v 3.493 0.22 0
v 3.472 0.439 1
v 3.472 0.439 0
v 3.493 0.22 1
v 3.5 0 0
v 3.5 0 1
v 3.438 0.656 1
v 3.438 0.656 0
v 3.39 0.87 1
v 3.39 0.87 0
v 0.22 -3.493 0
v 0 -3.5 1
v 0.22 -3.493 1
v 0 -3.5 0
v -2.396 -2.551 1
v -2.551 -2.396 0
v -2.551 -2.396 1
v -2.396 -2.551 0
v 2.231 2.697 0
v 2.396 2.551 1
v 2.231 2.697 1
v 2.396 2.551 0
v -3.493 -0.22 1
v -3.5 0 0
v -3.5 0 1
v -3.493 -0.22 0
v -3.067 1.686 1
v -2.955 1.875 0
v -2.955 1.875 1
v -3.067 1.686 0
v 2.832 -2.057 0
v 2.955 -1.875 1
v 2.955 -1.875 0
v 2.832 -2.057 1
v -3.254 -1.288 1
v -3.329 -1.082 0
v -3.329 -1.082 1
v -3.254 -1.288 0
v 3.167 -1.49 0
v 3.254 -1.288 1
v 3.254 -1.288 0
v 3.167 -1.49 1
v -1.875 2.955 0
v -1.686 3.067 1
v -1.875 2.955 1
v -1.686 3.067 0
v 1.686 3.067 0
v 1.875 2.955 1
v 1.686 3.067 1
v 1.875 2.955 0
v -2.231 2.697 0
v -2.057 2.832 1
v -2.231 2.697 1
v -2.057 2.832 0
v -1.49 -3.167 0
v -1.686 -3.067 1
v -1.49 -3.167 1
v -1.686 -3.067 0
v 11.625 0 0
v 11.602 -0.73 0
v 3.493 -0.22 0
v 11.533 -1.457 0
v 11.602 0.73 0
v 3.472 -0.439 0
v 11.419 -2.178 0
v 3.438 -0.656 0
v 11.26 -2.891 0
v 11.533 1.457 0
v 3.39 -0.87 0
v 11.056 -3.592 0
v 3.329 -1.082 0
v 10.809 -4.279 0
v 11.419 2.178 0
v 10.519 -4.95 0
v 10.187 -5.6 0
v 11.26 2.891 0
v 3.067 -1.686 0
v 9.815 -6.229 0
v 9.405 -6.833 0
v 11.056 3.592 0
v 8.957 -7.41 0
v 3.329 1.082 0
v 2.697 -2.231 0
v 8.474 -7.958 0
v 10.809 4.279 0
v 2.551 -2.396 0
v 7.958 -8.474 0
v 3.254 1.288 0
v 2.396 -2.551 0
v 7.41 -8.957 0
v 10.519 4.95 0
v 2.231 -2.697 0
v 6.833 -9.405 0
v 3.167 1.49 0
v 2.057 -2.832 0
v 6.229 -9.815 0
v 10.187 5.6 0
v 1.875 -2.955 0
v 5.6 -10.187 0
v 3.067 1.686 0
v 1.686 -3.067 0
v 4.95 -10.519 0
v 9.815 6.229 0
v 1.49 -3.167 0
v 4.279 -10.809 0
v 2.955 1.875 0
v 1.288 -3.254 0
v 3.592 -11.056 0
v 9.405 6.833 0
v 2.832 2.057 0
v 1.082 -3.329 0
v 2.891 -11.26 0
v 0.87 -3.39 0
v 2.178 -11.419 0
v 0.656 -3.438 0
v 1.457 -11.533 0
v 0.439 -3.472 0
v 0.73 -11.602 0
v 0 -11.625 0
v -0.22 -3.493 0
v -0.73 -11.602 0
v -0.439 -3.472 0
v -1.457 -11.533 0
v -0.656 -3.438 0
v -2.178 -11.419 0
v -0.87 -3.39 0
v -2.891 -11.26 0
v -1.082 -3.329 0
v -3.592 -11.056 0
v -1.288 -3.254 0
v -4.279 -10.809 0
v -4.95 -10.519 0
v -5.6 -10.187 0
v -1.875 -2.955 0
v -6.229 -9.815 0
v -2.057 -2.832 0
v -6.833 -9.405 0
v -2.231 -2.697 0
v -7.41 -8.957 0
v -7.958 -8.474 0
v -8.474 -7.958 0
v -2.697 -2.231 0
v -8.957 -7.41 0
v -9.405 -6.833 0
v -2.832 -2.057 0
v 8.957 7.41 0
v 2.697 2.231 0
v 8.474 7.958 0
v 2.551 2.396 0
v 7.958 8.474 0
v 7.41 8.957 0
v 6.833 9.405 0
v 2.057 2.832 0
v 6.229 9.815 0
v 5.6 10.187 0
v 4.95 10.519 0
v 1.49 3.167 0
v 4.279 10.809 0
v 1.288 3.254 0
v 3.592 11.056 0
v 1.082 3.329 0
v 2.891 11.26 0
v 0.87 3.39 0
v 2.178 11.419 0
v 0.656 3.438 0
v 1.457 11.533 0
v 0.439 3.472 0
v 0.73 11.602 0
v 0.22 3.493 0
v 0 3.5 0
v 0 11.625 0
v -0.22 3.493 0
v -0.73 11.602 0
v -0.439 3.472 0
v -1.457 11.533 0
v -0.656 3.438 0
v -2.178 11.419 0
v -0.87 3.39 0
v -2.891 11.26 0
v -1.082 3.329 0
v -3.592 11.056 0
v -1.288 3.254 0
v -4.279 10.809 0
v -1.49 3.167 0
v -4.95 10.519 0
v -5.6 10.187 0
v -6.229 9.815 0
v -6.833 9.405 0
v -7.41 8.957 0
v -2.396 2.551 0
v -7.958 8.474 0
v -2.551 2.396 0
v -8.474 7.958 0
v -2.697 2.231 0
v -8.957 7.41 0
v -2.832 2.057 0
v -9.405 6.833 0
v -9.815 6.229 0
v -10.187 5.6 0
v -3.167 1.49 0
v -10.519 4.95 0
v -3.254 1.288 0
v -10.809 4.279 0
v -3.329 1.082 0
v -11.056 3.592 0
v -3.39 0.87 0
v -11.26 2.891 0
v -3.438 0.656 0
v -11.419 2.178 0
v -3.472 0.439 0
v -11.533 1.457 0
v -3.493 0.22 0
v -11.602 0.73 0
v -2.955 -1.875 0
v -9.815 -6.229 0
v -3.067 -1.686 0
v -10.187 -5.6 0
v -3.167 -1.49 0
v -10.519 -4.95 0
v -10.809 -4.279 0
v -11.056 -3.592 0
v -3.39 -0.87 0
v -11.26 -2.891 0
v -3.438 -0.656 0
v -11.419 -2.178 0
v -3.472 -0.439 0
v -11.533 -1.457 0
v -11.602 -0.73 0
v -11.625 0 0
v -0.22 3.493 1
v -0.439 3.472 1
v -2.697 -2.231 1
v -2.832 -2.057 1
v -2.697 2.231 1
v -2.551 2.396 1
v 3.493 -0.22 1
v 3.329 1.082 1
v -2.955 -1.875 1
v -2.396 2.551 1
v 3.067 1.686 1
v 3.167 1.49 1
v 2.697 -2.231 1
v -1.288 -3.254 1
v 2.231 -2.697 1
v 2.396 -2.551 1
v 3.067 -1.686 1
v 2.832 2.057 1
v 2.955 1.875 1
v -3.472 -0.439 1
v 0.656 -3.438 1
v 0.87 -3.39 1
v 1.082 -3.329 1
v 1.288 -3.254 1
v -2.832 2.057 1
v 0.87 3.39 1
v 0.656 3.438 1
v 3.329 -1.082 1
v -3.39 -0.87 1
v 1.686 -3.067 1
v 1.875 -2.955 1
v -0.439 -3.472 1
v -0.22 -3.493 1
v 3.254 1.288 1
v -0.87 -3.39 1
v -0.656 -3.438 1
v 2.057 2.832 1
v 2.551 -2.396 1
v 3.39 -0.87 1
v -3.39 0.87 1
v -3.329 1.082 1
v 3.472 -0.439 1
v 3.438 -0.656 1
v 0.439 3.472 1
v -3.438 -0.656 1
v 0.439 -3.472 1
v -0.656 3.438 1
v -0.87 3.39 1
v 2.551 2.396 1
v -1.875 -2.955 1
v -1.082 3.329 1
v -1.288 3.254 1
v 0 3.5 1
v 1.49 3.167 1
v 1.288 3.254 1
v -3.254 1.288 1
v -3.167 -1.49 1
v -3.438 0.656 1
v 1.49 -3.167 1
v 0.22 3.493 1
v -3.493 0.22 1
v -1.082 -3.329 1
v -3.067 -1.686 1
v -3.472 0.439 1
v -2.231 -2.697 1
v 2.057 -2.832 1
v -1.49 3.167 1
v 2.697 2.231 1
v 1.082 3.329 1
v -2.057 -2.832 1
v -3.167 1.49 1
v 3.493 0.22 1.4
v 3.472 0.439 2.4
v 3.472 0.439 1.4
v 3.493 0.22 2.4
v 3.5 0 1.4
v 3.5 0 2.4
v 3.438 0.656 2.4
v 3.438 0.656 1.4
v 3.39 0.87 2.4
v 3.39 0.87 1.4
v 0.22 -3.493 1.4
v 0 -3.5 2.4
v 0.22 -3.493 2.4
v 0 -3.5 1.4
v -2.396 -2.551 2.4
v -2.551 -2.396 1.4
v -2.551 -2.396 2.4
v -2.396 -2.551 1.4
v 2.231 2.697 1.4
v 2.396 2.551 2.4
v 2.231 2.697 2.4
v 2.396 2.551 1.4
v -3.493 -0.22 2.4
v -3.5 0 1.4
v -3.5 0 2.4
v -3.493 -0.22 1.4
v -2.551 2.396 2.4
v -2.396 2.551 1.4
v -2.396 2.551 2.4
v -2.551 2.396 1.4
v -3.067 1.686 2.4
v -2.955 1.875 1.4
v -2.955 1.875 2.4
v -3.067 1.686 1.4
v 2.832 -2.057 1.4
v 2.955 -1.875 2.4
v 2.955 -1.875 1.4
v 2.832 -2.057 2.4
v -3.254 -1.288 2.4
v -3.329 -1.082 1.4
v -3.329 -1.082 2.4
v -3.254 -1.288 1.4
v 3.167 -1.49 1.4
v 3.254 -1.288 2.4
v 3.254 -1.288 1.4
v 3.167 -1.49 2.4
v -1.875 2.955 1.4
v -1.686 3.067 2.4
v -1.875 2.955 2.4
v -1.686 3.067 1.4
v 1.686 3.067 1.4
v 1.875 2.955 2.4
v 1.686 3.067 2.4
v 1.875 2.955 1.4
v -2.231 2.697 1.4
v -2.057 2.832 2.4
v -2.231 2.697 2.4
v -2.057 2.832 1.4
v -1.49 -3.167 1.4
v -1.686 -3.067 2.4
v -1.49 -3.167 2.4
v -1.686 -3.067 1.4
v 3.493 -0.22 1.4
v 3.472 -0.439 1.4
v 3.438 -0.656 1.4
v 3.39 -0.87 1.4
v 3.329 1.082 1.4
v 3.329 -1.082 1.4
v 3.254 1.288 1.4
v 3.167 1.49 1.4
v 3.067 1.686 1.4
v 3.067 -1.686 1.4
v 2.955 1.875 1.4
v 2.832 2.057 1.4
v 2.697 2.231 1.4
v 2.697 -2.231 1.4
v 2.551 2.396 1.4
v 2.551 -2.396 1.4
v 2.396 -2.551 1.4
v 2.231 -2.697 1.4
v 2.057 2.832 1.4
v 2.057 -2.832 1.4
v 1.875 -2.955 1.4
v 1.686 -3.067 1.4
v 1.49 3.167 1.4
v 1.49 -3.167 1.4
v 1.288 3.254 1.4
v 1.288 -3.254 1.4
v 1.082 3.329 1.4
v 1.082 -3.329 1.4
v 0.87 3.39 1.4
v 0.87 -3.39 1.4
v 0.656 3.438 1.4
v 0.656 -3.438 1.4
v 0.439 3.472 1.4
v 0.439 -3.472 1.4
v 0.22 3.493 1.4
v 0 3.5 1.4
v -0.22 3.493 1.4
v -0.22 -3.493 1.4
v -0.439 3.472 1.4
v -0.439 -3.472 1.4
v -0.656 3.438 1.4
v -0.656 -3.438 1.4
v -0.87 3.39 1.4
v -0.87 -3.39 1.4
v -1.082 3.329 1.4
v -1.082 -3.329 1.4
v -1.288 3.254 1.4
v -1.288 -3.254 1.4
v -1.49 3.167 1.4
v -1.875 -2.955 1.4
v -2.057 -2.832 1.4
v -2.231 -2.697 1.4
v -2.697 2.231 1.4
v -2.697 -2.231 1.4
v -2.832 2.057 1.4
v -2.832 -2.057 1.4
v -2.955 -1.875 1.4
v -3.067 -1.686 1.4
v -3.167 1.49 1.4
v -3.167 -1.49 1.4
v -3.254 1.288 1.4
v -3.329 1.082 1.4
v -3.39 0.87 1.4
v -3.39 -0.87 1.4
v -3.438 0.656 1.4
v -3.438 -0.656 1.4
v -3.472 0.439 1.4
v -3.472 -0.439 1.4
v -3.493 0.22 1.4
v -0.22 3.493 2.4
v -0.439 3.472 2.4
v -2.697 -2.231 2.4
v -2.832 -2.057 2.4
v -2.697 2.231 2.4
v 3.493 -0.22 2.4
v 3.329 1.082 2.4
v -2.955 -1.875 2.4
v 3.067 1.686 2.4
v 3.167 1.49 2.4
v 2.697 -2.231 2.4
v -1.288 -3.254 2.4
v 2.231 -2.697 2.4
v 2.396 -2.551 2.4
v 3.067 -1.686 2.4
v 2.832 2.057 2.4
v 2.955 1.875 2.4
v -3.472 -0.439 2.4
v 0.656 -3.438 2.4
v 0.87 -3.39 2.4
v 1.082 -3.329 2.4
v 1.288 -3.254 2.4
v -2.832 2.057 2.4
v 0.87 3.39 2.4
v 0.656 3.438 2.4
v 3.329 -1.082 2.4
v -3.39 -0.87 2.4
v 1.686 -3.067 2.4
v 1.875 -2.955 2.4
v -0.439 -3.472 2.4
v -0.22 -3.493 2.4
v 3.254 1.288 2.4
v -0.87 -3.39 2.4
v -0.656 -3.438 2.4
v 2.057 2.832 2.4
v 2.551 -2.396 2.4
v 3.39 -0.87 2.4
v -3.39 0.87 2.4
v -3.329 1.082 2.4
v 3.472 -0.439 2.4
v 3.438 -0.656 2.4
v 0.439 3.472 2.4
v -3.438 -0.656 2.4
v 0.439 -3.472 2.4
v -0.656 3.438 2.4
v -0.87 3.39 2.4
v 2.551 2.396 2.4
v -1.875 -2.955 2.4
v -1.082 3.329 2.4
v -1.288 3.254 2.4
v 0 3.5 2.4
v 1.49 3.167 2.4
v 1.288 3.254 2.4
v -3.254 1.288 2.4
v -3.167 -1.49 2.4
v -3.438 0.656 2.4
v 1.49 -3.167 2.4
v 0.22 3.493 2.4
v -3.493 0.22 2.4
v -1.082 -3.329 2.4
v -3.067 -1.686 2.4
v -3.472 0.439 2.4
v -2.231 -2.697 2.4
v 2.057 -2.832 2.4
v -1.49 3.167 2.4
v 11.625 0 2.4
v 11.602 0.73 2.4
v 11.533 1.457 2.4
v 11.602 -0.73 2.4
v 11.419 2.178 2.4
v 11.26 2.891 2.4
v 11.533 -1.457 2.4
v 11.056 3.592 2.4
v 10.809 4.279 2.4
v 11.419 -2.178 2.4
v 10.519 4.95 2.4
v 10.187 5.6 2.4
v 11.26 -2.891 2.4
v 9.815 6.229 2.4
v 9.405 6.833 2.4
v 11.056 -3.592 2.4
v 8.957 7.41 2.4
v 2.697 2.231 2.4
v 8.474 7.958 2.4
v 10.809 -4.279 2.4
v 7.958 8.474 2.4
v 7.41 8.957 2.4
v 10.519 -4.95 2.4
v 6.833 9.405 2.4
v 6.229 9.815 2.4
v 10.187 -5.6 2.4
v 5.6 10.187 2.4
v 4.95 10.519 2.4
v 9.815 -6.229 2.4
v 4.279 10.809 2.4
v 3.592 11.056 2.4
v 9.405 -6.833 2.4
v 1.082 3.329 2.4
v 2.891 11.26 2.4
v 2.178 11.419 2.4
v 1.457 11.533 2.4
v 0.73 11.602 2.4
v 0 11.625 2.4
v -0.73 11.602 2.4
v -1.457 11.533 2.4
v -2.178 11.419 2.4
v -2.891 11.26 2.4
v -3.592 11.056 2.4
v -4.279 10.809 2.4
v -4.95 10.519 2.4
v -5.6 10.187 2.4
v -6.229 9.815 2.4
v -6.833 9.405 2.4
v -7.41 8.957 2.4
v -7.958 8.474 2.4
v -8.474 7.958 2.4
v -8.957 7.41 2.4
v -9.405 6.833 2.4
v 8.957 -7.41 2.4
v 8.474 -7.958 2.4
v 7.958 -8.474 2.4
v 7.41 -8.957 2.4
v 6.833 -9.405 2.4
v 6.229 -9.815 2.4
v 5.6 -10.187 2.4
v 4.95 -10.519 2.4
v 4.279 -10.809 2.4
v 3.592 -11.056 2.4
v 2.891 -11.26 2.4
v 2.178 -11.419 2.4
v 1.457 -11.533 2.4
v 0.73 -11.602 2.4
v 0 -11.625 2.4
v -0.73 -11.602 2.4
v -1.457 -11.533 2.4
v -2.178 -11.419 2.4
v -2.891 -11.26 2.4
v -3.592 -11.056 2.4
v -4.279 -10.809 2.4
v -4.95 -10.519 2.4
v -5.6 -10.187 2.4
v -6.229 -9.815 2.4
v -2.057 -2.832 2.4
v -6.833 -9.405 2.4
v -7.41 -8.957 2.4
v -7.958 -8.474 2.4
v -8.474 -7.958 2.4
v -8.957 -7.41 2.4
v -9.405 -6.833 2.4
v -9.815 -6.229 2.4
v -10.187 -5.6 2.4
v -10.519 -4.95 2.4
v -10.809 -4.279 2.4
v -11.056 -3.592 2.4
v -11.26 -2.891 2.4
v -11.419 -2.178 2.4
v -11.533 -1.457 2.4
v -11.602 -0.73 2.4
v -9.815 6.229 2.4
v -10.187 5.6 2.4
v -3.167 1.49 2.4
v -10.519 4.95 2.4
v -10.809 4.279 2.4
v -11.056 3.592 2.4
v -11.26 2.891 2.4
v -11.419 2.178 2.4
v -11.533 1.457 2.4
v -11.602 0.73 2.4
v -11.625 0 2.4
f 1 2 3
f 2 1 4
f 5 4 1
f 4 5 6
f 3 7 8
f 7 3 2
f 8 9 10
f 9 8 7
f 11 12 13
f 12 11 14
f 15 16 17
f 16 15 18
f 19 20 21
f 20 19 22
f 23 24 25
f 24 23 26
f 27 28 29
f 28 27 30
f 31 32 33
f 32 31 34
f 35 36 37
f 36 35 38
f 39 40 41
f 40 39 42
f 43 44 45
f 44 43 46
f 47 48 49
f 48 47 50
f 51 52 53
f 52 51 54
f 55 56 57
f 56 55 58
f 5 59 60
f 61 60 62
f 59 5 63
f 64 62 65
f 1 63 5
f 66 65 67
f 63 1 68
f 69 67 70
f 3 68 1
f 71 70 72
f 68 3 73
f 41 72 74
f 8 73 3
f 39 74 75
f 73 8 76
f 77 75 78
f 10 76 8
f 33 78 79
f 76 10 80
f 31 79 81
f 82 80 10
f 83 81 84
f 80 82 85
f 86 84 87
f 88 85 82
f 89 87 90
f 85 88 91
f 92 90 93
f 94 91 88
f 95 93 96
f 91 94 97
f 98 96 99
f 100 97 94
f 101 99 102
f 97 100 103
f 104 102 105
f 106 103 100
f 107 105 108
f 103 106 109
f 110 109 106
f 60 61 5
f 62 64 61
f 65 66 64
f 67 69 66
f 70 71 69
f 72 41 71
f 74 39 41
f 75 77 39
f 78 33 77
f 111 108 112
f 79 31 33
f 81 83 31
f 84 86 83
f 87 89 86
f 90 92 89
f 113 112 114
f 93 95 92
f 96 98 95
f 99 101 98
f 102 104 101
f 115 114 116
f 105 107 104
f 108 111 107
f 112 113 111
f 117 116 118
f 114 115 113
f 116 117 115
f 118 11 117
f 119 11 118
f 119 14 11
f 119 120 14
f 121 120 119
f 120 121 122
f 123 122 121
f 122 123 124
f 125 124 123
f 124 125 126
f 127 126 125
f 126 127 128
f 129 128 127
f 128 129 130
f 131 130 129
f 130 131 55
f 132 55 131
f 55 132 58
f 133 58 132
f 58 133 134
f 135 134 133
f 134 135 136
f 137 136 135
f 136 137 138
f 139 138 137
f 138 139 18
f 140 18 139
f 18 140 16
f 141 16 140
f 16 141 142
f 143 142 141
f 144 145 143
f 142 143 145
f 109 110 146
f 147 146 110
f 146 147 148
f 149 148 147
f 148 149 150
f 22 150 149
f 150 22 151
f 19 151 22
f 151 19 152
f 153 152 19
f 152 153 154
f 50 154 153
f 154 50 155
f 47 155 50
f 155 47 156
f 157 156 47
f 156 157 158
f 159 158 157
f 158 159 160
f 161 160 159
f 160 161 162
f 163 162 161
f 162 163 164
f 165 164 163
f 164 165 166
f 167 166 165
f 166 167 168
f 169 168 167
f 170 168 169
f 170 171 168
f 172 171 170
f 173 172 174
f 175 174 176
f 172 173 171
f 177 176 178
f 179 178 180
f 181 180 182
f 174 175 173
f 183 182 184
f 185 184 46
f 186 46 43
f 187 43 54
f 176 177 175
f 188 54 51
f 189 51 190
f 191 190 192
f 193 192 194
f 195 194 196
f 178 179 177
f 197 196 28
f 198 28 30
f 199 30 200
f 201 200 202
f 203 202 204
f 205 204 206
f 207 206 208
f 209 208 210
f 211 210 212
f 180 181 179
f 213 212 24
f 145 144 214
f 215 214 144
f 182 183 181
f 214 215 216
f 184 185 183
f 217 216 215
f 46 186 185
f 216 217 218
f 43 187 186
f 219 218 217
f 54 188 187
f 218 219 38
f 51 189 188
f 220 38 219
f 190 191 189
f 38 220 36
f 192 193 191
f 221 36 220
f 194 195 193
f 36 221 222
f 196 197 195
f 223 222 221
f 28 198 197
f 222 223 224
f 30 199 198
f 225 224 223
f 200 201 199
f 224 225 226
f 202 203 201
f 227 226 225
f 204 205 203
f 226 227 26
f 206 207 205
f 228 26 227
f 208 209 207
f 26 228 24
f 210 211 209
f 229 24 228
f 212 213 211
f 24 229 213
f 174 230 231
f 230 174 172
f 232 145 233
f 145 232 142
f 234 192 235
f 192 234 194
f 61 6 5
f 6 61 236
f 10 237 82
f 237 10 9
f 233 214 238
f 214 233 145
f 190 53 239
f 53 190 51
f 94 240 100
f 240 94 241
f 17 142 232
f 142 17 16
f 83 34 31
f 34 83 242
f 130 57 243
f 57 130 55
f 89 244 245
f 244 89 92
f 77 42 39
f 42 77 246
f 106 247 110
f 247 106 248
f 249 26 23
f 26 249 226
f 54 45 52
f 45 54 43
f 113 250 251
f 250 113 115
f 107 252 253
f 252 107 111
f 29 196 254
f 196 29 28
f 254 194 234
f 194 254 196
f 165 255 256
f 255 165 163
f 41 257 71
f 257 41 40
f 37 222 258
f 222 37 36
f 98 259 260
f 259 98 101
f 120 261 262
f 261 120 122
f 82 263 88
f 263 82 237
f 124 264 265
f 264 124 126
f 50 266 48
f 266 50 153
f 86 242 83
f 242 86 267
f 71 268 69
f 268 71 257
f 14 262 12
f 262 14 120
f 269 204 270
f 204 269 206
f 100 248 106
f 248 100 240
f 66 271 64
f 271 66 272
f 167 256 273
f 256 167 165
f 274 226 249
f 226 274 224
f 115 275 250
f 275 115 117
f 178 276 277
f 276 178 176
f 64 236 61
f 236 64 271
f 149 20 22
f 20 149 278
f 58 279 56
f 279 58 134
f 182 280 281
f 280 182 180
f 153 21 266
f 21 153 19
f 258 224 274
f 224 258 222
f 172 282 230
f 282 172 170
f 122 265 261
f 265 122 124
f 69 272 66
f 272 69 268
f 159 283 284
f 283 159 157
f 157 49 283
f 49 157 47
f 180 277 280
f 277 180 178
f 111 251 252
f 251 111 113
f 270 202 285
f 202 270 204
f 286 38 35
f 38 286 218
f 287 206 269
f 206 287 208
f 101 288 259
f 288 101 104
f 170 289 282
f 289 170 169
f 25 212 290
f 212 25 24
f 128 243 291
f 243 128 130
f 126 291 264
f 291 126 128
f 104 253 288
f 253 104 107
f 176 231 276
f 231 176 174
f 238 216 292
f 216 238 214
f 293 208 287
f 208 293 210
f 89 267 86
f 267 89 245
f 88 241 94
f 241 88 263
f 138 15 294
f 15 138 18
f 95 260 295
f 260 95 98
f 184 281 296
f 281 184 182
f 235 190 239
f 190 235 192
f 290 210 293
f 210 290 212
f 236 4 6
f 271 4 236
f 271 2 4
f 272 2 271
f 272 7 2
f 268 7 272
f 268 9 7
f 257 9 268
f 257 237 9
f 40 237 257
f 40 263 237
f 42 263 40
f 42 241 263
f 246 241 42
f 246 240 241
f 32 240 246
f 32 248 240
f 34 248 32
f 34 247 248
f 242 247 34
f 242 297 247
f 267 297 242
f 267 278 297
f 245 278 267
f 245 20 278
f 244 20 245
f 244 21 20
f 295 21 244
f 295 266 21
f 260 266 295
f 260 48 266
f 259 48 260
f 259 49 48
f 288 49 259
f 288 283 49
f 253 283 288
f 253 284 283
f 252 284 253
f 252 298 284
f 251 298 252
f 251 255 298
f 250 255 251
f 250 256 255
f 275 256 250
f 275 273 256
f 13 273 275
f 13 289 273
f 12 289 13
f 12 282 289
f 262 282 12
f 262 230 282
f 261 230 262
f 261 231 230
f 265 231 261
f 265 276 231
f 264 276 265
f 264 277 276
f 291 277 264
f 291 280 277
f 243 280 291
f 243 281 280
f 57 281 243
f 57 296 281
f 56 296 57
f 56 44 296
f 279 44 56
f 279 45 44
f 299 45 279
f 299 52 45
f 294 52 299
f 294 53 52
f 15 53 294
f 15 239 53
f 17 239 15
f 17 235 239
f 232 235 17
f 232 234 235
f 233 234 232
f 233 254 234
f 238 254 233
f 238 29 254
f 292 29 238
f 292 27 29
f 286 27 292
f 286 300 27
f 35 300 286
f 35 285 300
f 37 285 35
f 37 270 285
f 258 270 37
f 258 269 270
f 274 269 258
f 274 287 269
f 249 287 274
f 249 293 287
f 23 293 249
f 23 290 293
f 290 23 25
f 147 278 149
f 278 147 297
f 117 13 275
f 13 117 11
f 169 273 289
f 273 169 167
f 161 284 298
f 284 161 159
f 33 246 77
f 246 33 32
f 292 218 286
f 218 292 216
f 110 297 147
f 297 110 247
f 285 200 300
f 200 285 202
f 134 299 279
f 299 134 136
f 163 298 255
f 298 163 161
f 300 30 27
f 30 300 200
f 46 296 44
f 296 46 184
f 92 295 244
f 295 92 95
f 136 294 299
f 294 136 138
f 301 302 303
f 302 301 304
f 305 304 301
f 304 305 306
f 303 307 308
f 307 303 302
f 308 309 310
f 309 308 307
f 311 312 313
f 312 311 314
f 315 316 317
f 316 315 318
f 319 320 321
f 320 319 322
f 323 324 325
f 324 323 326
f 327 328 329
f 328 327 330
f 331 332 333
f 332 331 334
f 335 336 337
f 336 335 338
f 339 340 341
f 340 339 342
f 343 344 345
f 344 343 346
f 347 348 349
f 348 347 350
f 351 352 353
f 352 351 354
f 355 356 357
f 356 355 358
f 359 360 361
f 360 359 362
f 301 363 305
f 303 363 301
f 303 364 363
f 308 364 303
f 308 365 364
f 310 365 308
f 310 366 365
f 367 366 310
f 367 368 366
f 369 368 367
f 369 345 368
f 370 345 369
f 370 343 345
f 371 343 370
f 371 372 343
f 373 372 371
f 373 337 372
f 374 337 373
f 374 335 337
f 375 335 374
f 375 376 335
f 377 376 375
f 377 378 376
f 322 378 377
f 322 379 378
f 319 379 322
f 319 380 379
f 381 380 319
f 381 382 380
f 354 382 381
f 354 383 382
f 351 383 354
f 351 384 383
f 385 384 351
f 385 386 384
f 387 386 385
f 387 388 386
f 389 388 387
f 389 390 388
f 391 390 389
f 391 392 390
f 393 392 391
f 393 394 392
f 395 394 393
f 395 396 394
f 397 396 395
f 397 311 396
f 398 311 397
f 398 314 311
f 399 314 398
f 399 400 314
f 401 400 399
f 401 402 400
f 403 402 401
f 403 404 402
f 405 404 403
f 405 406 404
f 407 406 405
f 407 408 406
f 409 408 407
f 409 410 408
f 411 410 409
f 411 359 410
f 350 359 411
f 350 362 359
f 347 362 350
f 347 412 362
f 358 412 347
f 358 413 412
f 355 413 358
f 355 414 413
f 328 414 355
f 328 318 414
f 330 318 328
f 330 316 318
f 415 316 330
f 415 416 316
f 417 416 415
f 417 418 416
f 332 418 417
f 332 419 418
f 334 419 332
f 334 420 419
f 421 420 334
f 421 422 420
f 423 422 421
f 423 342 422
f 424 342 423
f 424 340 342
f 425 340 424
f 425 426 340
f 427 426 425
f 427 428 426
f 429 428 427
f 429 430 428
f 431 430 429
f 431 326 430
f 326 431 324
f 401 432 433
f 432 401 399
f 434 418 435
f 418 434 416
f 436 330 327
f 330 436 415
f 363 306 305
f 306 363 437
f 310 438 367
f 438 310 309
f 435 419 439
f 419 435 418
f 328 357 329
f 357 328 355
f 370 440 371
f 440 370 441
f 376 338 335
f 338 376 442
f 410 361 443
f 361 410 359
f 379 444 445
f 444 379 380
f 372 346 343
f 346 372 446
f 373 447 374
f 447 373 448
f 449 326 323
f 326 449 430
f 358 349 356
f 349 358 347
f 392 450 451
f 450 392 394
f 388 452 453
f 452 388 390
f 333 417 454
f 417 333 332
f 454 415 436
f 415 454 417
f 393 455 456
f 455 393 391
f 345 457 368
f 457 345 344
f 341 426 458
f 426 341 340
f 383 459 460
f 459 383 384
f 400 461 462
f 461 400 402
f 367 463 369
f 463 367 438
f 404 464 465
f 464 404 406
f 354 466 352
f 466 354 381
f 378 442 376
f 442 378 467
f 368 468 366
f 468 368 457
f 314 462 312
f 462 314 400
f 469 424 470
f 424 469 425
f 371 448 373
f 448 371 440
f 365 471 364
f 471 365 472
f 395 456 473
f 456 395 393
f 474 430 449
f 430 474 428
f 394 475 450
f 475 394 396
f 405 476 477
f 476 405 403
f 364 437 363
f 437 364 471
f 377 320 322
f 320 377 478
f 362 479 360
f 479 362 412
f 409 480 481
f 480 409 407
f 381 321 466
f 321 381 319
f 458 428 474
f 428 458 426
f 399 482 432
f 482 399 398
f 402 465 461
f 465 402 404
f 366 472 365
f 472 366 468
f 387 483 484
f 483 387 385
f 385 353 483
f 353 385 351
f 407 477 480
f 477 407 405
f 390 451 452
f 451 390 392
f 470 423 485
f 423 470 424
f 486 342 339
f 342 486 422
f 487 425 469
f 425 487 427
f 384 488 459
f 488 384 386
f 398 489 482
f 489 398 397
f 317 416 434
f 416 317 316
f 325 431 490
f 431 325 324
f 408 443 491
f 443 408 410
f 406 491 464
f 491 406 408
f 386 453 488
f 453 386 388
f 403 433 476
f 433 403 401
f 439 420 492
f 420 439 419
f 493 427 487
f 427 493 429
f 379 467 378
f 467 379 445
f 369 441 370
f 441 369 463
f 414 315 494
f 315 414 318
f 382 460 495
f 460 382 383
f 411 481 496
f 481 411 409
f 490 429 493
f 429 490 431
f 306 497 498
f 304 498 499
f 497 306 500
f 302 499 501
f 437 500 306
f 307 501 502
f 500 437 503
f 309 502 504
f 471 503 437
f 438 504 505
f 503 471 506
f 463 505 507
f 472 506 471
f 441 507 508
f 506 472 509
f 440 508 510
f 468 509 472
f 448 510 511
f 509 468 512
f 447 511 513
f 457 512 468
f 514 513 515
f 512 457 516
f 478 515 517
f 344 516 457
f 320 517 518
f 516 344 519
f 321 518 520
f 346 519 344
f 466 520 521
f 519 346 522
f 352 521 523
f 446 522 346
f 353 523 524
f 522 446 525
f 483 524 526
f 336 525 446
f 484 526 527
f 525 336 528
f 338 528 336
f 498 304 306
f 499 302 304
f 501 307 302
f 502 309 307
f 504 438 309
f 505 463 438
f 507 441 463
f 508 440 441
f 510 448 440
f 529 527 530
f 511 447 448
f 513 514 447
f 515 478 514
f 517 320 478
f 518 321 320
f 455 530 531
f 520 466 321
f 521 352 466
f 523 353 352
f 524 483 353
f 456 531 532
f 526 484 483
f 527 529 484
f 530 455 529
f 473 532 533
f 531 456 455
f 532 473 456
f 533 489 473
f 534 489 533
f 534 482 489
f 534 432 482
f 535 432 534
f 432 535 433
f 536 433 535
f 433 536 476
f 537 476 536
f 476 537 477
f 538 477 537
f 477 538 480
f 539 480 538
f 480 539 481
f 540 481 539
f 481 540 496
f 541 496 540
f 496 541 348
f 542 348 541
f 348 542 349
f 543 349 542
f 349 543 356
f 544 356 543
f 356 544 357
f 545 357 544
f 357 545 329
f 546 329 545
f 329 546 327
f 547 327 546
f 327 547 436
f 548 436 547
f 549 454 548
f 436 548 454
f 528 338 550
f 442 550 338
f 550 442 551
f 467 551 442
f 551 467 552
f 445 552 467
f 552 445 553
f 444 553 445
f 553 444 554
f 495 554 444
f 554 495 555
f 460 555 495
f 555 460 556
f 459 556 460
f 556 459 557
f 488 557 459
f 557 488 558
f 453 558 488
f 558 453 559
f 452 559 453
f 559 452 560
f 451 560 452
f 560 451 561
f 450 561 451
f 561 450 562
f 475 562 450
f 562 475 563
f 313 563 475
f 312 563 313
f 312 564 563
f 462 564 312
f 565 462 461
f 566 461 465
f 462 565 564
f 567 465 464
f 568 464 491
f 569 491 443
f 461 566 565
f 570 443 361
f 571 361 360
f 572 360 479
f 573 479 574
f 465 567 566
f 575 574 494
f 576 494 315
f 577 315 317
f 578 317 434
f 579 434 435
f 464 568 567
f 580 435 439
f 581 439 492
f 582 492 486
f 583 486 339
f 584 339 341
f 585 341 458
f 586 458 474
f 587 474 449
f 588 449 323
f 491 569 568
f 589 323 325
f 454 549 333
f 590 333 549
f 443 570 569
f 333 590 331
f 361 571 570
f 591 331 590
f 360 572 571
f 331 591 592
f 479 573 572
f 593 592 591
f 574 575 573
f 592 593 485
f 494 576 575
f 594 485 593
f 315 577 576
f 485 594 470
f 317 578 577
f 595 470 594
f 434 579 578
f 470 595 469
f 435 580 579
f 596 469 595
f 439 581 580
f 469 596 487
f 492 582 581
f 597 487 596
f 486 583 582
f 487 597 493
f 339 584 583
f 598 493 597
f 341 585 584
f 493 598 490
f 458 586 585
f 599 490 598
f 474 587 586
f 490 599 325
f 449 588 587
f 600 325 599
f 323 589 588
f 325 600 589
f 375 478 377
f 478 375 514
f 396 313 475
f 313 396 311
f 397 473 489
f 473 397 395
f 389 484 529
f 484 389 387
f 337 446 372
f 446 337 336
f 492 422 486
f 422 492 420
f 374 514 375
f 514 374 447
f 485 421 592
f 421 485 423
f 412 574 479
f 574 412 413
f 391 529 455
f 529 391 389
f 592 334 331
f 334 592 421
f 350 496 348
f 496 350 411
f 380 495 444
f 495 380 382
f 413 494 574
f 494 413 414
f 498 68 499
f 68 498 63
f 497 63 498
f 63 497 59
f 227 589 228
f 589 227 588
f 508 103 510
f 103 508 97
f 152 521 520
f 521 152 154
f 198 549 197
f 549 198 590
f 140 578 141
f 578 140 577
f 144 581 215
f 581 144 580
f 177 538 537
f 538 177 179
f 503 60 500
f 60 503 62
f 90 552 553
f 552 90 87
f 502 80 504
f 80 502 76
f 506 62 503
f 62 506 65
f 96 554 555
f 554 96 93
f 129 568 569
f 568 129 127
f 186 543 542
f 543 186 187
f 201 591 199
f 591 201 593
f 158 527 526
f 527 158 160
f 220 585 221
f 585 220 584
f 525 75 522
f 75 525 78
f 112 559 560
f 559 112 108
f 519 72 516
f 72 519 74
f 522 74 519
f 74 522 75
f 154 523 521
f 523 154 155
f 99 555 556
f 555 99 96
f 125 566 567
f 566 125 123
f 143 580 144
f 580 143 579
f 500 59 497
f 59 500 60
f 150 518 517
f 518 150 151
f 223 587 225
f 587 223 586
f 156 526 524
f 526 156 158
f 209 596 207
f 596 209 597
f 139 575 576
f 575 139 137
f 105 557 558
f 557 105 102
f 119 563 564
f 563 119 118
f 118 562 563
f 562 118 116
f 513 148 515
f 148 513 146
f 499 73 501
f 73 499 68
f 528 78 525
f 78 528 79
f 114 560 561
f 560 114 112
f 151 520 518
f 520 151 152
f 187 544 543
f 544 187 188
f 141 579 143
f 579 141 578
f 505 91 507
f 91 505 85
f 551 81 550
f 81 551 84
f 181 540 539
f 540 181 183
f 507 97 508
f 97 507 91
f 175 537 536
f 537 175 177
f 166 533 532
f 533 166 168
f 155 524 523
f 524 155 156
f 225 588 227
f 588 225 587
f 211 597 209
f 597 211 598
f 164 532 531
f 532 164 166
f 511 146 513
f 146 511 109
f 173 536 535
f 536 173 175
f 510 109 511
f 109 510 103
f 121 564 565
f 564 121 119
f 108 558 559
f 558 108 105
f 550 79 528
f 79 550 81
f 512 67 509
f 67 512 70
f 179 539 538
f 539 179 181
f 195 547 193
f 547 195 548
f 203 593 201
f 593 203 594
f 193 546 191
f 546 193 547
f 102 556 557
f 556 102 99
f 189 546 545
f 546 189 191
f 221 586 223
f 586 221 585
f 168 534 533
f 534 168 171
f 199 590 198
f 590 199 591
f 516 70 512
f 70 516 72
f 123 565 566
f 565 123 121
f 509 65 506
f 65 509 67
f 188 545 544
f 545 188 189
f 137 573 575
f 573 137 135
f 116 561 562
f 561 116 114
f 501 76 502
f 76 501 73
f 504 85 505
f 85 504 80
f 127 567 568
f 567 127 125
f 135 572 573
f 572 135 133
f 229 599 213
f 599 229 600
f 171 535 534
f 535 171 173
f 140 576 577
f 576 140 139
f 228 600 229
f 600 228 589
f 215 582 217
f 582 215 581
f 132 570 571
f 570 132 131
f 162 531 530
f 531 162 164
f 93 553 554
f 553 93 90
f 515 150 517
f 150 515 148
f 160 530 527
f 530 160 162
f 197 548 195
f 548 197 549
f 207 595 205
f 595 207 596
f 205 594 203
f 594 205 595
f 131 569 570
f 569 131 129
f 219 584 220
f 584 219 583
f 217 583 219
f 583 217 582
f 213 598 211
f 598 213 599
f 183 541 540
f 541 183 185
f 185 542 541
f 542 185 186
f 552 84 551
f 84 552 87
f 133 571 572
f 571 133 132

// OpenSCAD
D = 23.25;
H = 2.4; //2.33;

difference(){
    cylinder(d=D,h=H,$fn=100);
    union(){
        cylinder(d=7,h=1,$fn=100);
        translate([0,0,H-1])
        cylinder(d=7,h=1,$fn=100);
    }
}

//difference(){
//    hull(){
//        
//        cylinder(d=D-1,h=0.001,$fn=50);
//        
//        translate([0,0,0.4])
//            cylinder(d=D,h=0.001,$fn=50);
//            
//        translate([0,0,H-0.4])
//            cylinder(d=D,h=0.001,$fn=50);
//        
//        translate([0,0,H])
//            cylinder(d=D-1,h=0.001,$fn=50);
//    }
//    
//    union(){
////        hull(){
////            cylinder(d=7,h=0.001,$fn=50);
////            translate([0,0,0.4])
////            cylinder(d=7-1,h=0.001,$fn=50);            
////        }
//        hull(){
//            translate([0,0,H-0.4])
//                cylinder(d=7-1,h=0.001,$fn=50);
//            translate([0,0,H])
//                cylinder(d=7,h=0.001,$fn=50);
//
//        }
//    }
//}
